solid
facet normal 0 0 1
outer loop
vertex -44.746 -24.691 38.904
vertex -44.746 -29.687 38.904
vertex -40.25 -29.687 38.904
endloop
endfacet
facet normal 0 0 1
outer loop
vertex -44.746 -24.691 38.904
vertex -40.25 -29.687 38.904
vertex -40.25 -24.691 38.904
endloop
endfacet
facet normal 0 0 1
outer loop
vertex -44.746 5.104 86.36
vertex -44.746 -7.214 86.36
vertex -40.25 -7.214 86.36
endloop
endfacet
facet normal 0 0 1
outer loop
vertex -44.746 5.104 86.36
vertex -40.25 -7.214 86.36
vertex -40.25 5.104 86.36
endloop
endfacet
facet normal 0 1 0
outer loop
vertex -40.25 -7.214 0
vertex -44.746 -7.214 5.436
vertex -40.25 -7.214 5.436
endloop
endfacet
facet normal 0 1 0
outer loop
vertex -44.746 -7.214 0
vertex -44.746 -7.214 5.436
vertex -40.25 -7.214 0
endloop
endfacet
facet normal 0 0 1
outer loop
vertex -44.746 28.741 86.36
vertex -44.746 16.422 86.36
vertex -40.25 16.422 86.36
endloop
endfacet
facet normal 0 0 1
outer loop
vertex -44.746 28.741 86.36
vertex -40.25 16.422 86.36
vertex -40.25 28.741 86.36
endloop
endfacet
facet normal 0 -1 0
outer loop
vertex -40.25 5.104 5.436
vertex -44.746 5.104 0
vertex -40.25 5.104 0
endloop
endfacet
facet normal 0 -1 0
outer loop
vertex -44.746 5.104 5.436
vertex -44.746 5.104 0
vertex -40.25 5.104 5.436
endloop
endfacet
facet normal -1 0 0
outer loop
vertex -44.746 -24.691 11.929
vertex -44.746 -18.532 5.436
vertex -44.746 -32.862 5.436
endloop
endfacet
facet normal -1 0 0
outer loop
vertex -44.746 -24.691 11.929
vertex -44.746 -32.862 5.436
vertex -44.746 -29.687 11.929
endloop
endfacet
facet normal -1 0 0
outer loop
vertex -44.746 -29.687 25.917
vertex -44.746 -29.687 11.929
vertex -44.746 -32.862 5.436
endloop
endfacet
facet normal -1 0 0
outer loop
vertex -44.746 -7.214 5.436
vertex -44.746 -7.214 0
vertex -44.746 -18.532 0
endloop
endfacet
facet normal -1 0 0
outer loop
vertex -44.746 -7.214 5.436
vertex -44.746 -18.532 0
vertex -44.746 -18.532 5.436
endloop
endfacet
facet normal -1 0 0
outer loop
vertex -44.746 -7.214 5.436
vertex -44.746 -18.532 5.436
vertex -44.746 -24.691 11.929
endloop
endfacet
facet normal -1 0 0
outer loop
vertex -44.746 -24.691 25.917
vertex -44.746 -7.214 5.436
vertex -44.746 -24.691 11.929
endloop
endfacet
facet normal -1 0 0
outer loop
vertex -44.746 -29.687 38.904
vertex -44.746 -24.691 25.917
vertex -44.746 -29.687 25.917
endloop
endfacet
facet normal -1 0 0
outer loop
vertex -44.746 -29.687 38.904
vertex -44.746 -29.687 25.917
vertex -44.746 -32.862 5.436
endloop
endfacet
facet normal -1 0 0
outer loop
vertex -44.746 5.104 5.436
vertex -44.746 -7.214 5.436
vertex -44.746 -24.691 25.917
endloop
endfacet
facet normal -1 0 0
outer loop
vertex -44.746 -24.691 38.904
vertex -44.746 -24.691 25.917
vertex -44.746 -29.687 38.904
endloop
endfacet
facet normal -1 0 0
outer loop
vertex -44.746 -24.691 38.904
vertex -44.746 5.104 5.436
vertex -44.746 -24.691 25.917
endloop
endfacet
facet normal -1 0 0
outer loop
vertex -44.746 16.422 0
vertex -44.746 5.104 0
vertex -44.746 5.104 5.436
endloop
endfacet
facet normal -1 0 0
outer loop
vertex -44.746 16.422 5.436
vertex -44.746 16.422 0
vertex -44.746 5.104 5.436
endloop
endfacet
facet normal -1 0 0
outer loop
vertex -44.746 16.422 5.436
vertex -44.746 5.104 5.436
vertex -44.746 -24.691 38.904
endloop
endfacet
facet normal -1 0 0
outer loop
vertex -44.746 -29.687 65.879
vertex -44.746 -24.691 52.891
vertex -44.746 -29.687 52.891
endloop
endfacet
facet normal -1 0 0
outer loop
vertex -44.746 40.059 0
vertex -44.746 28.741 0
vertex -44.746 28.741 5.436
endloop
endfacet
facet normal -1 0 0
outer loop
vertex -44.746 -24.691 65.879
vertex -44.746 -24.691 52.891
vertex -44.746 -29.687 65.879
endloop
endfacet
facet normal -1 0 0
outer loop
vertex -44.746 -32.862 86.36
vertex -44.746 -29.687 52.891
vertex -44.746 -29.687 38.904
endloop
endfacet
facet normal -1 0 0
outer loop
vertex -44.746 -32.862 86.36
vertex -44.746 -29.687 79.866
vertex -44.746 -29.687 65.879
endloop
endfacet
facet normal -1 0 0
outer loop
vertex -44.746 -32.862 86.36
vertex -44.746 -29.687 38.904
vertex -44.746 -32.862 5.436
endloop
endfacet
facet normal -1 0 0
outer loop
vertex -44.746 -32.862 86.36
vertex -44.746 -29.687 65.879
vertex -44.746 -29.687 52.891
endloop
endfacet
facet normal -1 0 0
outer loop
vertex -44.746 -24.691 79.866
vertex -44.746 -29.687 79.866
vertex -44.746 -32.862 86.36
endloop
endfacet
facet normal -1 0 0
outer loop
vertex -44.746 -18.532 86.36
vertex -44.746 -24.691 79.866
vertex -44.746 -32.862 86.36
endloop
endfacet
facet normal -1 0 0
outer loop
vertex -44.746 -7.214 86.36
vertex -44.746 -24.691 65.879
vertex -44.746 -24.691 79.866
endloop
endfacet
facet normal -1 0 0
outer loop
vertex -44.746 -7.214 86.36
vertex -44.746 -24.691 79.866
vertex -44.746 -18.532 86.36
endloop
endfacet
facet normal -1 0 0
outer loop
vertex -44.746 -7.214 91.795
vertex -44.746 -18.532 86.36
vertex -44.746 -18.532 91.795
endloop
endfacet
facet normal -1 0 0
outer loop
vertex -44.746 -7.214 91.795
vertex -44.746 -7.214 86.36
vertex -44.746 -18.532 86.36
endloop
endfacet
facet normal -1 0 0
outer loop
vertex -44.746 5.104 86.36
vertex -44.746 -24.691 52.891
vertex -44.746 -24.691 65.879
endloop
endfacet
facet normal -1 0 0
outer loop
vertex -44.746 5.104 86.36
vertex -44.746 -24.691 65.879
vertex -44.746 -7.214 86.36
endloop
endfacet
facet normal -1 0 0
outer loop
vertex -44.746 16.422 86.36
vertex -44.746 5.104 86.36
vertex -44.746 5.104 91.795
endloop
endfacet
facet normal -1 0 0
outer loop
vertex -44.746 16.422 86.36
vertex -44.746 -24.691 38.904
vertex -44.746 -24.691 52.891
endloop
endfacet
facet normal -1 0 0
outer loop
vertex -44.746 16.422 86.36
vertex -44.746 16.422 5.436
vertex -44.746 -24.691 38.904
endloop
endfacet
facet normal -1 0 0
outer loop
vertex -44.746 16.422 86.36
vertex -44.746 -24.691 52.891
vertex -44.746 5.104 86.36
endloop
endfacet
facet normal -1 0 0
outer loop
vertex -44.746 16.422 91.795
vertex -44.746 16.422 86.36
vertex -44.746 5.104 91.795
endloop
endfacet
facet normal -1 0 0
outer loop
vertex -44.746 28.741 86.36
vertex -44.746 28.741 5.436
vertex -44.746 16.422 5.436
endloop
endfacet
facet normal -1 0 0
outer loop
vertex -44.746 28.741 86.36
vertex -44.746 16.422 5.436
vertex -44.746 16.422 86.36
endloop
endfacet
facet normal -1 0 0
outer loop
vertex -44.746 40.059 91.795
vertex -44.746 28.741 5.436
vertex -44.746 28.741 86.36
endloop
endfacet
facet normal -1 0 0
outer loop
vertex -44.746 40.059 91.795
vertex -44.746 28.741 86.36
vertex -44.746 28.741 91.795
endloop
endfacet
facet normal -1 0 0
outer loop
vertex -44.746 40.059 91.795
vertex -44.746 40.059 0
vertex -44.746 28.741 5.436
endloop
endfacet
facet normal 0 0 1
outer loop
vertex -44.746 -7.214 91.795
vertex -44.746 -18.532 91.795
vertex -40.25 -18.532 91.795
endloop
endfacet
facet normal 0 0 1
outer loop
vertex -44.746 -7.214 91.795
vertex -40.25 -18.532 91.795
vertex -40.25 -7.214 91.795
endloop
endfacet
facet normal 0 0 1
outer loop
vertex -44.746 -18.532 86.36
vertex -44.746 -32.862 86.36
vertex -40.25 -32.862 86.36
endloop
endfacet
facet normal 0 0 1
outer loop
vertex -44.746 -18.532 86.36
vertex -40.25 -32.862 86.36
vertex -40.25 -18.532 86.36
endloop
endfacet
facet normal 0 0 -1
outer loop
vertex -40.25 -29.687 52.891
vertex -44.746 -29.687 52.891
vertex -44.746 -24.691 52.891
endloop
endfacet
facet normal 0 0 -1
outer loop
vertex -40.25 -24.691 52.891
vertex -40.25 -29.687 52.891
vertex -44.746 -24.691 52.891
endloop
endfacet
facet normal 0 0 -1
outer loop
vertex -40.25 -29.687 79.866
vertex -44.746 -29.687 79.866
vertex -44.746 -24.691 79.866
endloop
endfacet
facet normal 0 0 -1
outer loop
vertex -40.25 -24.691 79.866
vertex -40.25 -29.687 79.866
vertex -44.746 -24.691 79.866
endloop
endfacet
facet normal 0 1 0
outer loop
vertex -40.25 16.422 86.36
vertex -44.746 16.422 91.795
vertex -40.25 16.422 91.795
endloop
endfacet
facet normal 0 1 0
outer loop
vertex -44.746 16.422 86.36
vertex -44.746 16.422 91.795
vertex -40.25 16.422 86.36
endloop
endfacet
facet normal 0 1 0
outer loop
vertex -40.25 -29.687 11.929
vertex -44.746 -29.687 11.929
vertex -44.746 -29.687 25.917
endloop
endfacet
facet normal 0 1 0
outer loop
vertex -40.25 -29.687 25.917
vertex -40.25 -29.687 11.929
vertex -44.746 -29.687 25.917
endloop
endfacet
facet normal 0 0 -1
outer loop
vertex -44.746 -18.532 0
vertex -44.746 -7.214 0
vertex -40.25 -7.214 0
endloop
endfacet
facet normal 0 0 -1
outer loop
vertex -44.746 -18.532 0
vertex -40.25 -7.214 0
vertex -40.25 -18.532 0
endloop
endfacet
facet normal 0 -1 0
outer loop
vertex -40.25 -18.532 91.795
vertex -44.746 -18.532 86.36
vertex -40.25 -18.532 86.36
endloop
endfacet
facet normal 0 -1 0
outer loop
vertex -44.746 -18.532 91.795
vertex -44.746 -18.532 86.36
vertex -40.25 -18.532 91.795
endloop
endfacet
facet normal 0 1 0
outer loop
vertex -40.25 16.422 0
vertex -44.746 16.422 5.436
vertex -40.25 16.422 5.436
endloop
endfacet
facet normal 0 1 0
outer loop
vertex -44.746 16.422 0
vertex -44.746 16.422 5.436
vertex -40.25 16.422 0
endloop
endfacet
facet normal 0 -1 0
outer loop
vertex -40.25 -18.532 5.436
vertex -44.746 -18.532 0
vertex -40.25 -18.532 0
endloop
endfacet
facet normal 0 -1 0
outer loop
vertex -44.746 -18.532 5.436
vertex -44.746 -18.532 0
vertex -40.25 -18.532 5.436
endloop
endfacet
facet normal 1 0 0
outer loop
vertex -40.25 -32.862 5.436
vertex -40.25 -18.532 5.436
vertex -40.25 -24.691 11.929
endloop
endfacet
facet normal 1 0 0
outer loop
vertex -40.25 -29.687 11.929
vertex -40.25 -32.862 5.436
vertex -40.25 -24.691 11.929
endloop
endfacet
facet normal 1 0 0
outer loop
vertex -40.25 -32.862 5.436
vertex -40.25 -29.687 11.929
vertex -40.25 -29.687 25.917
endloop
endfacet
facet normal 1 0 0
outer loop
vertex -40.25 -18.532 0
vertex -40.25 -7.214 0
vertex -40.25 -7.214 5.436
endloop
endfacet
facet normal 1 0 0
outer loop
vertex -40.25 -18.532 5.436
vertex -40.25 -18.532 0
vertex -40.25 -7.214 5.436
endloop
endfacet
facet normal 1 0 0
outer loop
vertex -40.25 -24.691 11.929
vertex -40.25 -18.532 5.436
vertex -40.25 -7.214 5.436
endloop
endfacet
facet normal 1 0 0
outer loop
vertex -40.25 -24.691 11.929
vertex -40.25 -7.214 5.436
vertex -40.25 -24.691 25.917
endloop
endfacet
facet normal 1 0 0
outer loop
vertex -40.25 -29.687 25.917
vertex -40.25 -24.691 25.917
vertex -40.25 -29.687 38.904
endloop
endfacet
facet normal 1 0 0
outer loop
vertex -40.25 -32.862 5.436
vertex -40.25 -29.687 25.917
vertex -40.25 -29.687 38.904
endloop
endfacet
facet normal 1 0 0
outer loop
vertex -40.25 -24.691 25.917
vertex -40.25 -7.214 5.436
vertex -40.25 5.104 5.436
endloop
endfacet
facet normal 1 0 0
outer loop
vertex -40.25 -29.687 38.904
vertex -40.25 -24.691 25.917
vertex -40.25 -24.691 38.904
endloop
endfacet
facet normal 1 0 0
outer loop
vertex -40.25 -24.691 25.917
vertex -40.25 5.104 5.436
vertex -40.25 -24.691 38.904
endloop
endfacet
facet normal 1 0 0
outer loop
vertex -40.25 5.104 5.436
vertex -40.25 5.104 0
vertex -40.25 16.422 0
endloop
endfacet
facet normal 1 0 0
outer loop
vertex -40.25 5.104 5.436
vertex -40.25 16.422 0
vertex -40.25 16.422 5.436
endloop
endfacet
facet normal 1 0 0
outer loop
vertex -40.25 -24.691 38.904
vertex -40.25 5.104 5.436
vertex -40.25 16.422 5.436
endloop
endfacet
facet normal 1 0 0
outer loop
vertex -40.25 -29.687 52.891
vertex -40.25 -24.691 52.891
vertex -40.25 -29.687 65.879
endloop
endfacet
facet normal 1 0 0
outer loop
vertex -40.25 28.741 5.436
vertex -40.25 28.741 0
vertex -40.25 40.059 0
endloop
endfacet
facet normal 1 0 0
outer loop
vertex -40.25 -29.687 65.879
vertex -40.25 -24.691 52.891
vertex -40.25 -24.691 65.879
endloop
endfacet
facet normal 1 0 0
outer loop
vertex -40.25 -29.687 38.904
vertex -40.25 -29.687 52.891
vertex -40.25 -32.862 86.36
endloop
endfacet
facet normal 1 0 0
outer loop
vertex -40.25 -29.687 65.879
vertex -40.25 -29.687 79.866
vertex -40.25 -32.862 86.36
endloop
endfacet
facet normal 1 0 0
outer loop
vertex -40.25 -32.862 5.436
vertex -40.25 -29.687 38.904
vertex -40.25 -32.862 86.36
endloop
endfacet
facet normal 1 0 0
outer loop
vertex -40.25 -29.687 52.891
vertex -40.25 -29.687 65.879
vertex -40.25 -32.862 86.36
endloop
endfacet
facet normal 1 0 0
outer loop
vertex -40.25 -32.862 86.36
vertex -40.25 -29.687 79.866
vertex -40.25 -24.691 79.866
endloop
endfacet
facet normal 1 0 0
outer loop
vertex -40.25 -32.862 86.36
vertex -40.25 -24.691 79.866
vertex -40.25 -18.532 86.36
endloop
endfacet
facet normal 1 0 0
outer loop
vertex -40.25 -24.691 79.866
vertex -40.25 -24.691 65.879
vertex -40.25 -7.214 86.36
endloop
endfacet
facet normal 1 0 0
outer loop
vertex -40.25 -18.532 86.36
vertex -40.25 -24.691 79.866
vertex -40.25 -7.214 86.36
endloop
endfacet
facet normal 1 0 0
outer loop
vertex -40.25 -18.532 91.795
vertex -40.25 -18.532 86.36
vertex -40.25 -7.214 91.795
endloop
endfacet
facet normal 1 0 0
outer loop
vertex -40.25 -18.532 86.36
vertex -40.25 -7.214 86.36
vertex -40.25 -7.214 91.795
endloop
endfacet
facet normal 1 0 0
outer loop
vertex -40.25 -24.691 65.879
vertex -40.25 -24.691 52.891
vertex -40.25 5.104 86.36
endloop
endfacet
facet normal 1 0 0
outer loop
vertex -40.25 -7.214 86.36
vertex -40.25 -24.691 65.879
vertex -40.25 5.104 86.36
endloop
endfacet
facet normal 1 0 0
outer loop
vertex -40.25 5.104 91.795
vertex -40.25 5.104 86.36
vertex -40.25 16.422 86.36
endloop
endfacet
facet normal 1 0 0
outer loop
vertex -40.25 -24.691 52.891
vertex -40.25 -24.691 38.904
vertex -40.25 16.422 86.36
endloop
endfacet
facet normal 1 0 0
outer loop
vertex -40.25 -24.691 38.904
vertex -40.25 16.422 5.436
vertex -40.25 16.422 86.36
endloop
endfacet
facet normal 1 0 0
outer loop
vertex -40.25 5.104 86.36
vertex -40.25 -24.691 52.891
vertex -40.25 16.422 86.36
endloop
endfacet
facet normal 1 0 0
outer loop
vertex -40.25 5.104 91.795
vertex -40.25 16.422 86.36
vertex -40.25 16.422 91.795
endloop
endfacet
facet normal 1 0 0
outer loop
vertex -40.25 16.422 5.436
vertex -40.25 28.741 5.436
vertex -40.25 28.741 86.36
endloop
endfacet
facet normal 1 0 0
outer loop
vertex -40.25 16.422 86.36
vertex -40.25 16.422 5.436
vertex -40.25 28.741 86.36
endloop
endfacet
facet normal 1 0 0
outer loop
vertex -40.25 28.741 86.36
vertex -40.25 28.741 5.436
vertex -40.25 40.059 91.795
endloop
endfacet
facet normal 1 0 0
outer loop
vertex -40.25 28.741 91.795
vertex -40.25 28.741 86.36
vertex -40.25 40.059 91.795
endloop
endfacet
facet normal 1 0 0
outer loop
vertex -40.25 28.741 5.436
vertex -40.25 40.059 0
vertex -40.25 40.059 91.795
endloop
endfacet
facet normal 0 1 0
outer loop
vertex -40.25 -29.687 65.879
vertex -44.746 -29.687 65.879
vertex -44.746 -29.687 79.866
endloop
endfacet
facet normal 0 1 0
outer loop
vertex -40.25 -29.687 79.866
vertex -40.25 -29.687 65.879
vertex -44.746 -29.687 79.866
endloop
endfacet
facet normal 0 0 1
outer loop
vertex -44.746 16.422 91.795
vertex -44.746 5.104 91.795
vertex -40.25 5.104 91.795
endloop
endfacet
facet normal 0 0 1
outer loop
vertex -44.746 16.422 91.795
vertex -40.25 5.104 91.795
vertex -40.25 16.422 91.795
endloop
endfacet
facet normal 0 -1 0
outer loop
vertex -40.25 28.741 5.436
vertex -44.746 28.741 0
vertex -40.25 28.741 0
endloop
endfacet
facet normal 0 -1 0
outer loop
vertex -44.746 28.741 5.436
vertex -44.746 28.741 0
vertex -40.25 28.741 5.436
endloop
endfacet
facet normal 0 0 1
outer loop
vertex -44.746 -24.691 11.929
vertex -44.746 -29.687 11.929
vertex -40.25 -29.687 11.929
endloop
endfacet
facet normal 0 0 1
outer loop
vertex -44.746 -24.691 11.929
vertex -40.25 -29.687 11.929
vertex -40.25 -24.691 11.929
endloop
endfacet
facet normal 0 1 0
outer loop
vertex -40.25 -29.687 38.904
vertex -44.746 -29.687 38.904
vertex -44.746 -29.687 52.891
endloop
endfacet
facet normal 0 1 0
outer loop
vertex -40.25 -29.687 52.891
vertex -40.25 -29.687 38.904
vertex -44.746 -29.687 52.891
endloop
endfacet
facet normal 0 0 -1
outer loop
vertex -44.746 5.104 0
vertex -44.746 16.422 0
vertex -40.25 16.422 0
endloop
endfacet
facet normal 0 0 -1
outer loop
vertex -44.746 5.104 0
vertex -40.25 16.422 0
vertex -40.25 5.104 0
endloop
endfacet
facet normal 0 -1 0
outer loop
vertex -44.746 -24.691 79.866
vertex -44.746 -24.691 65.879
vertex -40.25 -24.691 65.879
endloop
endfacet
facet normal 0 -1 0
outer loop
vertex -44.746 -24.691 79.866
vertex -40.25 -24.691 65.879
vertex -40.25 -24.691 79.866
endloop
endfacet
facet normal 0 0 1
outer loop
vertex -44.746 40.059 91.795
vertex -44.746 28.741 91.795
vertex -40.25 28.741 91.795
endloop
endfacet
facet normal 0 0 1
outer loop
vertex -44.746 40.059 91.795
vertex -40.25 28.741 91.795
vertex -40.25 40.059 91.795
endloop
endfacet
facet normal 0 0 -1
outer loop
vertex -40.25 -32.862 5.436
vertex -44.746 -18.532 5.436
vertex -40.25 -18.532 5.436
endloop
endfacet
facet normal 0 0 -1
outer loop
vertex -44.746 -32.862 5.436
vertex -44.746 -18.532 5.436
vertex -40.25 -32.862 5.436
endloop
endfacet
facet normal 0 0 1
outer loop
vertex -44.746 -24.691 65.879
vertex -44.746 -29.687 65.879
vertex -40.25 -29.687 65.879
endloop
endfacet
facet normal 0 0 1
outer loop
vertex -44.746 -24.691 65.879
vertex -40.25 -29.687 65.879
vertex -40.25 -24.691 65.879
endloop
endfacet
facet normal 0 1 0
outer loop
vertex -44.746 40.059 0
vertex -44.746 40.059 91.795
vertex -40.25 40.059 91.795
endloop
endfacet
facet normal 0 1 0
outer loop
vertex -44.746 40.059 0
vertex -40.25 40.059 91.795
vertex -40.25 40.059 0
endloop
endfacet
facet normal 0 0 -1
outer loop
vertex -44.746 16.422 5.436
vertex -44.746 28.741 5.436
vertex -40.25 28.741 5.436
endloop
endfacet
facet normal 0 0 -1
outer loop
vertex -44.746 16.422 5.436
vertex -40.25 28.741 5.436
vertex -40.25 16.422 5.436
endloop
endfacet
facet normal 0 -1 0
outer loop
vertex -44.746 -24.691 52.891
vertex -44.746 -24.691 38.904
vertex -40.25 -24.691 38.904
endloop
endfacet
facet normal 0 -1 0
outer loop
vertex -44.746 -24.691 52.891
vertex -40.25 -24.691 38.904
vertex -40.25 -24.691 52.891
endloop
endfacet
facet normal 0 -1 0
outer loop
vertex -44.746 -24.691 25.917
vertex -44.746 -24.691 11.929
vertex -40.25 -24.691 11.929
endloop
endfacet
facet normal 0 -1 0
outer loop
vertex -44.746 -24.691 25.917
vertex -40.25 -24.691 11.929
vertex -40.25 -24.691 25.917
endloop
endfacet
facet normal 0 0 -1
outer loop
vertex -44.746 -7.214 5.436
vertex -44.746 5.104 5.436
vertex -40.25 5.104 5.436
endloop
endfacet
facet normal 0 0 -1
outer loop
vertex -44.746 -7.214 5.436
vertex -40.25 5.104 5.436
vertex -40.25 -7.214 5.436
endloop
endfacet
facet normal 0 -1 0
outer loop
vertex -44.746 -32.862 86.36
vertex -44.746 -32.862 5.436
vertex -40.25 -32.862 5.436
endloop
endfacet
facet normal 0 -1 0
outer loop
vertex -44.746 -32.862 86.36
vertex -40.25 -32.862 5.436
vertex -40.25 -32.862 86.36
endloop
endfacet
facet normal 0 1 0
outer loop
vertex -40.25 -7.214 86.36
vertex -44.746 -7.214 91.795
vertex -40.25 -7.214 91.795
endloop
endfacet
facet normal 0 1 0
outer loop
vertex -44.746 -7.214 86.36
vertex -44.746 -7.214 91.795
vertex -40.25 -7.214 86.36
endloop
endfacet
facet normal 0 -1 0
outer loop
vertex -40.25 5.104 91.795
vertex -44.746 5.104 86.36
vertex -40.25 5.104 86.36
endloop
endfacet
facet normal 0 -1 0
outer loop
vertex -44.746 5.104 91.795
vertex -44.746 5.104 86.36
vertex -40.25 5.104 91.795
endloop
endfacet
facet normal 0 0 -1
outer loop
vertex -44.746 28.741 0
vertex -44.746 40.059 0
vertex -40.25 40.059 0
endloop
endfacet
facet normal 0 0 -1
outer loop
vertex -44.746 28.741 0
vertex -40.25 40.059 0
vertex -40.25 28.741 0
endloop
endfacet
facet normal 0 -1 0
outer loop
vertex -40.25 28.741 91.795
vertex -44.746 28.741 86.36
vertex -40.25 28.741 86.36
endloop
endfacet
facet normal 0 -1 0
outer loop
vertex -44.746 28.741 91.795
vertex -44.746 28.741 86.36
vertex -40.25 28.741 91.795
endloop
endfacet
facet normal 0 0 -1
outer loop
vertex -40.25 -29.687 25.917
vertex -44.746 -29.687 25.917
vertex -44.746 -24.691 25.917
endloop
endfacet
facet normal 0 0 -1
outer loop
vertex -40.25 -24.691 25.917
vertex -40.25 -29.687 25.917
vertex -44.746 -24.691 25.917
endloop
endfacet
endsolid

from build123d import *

# Parameters (mm, degrees)
SKETCH2_W           = 13.987360838
SKETCH2_H           = 4.9958
SKETCH2_W_2         = 13.987360839
BOSS_EXTRUDE1_DEPTH = 4.4958


with BuildPart() as part:
    # Sketch2 → Boss-Extrude1 (new body)
    with BuildSketch(Plane.ZY.offset(44.7458)):
        Polygon((5.4356, 40.058729674), (0, 40.058729674), (0, 28.740547856), (5.4356, 28.740547856), (5.4356, 16.422366038), (0, 16.422366038), (0, 5.104184219), (5.4356, 5.104184219), (5.4356, -7.213997599), (0, -7.213997599), (0, -18.532179417), (5.4356, -18.532179417), (5.4356, -32.862070326), (86.359765029, -32.862070326), (86.359765029, -18.532179417), (91.795365029, -18.532179417), (91.795365029, -7.213997599), (86.359765029, -7.213997599), (86.359765029, 5.104184219), (91.795365029, 5.104184219), (91.795365029, 16.422366038), (86.359765029, 16.422366038), (86.359765029, 28.740547856), (91.795365029, 28.740547856), (91.795365029, 40.058729674), (86.359765029, 40.058729674), align=None)
        with Locations((18.922960838, -27.189170326)):
            Rectangle(SKETCH2_W, SKETCH2_H, mode=Mode.SUBTRACT)
        with Locations((45.897682515, -27.189170326)):
            Rectangle(SKETCH2_W_2, SKETCH2_H, mode=Mode.SUBTRACT)
        with Locations((72.872404191, -27.189170326)):
            Rectangle(SKETCH2_W, SKETCH2_H, mode=Mode.SUBTRACT)
    extrude(amount=-BOSS_EXTRUDE1_DEPTH)


solid = part.part
